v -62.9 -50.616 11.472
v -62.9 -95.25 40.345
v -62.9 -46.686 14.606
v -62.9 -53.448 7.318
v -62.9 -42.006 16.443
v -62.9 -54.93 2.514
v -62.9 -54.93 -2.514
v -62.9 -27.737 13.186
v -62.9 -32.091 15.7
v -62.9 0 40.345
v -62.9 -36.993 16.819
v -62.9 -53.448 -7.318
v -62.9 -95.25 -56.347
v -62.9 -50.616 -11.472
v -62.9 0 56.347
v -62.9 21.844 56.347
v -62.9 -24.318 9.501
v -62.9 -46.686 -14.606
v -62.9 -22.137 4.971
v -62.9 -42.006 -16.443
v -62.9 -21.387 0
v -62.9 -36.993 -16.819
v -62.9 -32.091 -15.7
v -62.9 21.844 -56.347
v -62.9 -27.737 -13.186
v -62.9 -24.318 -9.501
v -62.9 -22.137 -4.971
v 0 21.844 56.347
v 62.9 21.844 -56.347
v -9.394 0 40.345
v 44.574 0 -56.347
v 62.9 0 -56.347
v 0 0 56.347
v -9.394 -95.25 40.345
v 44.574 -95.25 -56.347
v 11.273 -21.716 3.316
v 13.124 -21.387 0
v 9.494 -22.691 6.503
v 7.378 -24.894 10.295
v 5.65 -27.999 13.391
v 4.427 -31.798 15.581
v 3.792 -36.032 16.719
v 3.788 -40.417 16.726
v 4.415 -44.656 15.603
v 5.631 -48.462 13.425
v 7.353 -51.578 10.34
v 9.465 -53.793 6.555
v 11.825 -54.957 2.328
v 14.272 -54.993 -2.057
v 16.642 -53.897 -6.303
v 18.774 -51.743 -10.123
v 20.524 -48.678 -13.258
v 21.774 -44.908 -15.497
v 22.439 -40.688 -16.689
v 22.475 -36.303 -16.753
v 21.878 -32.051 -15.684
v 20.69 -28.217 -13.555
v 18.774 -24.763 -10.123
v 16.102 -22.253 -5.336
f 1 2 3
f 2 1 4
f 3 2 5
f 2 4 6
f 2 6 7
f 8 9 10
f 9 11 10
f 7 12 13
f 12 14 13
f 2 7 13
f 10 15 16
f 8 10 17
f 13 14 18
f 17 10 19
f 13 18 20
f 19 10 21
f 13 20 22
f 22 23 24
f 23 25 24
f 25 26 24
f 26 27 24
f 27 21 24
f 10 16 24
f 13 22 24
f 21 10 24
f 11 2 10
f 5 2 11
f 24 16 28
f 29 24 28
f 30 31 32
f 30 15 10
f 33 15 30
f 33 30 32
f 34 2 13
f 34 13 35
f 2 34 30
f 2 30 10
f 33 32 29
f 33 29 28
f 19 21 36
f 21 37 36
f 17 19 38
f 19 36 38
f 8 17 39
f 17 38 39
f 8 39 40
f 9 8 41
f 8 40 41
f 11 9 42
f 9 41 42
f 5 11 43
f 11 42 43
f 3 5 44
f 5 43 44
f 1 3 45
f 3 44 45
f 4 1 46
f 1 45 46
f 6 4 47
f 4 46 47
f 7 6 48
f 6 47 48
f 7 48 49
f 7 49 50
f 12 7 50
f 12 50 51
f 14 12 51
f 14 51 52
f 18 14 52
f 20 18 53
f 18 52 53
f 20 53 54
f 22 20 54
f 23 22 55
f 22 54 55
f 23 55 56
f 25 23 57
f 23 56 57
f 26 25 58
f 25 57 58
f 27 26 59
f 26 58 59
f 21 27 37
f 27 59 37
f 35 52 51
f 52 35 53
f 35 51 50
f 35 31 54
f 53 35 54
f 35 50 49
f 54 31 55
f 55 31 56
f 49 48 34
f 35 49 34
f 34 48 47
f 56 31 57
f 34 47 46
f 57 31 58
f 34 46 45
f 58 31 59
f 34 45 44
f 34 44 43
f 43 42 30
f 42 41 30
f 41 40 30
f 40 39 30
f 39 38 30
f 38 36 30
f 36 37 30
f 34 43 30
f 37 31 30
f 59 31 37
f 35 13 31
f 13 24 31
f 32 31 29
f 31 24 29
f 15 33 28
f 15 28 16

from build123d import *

# Parameters (mm, degrees)
F1_DEPTH = 21.844
F2_DEPTH = 95.25
F3_R     = 16.86574
F4_DEPTH = 63.5


with BuildPart() as f1:
    # F0 (on Front) → F1 (new body)
    with BuildSketch(Plane.XZ):
        Polygon((62.899669, -56.346651), (0, 56.346651), (-62.899669, 56.346651), (-62.899669, 40.344652), (-9.394319, 40.344652), (44.573848, -56.346651), align=None)
        Polygon((-9.394319, 40.344652), (-62.899669, 40.344652), (-62.899669, -56.346651), (44.573848, -56.346651), align=None)
    extrude(amount=-F1_DEPTH)

    # F0 (on Front) → F2 (join)
    with BuildSketch(Plane.XZ):
        Polygon((-9.394319, 40.344652), (-62.899669, 40.344652), (-62.899669, -56.346651), (44.573848, -56.346651), align=None)
    extrude(amount=F2_DEPTH)

    # F3 (on Right) → F4 (cut, symmetric)
    with BuildSketch(Plane.YZ):
        with Locations((-38.252983, 0)):
            Circle(F3_R)
    extrude(amount=F4_DEPTH, both=True, mode=Mode.SUBTRACT)


solid = f1.part
